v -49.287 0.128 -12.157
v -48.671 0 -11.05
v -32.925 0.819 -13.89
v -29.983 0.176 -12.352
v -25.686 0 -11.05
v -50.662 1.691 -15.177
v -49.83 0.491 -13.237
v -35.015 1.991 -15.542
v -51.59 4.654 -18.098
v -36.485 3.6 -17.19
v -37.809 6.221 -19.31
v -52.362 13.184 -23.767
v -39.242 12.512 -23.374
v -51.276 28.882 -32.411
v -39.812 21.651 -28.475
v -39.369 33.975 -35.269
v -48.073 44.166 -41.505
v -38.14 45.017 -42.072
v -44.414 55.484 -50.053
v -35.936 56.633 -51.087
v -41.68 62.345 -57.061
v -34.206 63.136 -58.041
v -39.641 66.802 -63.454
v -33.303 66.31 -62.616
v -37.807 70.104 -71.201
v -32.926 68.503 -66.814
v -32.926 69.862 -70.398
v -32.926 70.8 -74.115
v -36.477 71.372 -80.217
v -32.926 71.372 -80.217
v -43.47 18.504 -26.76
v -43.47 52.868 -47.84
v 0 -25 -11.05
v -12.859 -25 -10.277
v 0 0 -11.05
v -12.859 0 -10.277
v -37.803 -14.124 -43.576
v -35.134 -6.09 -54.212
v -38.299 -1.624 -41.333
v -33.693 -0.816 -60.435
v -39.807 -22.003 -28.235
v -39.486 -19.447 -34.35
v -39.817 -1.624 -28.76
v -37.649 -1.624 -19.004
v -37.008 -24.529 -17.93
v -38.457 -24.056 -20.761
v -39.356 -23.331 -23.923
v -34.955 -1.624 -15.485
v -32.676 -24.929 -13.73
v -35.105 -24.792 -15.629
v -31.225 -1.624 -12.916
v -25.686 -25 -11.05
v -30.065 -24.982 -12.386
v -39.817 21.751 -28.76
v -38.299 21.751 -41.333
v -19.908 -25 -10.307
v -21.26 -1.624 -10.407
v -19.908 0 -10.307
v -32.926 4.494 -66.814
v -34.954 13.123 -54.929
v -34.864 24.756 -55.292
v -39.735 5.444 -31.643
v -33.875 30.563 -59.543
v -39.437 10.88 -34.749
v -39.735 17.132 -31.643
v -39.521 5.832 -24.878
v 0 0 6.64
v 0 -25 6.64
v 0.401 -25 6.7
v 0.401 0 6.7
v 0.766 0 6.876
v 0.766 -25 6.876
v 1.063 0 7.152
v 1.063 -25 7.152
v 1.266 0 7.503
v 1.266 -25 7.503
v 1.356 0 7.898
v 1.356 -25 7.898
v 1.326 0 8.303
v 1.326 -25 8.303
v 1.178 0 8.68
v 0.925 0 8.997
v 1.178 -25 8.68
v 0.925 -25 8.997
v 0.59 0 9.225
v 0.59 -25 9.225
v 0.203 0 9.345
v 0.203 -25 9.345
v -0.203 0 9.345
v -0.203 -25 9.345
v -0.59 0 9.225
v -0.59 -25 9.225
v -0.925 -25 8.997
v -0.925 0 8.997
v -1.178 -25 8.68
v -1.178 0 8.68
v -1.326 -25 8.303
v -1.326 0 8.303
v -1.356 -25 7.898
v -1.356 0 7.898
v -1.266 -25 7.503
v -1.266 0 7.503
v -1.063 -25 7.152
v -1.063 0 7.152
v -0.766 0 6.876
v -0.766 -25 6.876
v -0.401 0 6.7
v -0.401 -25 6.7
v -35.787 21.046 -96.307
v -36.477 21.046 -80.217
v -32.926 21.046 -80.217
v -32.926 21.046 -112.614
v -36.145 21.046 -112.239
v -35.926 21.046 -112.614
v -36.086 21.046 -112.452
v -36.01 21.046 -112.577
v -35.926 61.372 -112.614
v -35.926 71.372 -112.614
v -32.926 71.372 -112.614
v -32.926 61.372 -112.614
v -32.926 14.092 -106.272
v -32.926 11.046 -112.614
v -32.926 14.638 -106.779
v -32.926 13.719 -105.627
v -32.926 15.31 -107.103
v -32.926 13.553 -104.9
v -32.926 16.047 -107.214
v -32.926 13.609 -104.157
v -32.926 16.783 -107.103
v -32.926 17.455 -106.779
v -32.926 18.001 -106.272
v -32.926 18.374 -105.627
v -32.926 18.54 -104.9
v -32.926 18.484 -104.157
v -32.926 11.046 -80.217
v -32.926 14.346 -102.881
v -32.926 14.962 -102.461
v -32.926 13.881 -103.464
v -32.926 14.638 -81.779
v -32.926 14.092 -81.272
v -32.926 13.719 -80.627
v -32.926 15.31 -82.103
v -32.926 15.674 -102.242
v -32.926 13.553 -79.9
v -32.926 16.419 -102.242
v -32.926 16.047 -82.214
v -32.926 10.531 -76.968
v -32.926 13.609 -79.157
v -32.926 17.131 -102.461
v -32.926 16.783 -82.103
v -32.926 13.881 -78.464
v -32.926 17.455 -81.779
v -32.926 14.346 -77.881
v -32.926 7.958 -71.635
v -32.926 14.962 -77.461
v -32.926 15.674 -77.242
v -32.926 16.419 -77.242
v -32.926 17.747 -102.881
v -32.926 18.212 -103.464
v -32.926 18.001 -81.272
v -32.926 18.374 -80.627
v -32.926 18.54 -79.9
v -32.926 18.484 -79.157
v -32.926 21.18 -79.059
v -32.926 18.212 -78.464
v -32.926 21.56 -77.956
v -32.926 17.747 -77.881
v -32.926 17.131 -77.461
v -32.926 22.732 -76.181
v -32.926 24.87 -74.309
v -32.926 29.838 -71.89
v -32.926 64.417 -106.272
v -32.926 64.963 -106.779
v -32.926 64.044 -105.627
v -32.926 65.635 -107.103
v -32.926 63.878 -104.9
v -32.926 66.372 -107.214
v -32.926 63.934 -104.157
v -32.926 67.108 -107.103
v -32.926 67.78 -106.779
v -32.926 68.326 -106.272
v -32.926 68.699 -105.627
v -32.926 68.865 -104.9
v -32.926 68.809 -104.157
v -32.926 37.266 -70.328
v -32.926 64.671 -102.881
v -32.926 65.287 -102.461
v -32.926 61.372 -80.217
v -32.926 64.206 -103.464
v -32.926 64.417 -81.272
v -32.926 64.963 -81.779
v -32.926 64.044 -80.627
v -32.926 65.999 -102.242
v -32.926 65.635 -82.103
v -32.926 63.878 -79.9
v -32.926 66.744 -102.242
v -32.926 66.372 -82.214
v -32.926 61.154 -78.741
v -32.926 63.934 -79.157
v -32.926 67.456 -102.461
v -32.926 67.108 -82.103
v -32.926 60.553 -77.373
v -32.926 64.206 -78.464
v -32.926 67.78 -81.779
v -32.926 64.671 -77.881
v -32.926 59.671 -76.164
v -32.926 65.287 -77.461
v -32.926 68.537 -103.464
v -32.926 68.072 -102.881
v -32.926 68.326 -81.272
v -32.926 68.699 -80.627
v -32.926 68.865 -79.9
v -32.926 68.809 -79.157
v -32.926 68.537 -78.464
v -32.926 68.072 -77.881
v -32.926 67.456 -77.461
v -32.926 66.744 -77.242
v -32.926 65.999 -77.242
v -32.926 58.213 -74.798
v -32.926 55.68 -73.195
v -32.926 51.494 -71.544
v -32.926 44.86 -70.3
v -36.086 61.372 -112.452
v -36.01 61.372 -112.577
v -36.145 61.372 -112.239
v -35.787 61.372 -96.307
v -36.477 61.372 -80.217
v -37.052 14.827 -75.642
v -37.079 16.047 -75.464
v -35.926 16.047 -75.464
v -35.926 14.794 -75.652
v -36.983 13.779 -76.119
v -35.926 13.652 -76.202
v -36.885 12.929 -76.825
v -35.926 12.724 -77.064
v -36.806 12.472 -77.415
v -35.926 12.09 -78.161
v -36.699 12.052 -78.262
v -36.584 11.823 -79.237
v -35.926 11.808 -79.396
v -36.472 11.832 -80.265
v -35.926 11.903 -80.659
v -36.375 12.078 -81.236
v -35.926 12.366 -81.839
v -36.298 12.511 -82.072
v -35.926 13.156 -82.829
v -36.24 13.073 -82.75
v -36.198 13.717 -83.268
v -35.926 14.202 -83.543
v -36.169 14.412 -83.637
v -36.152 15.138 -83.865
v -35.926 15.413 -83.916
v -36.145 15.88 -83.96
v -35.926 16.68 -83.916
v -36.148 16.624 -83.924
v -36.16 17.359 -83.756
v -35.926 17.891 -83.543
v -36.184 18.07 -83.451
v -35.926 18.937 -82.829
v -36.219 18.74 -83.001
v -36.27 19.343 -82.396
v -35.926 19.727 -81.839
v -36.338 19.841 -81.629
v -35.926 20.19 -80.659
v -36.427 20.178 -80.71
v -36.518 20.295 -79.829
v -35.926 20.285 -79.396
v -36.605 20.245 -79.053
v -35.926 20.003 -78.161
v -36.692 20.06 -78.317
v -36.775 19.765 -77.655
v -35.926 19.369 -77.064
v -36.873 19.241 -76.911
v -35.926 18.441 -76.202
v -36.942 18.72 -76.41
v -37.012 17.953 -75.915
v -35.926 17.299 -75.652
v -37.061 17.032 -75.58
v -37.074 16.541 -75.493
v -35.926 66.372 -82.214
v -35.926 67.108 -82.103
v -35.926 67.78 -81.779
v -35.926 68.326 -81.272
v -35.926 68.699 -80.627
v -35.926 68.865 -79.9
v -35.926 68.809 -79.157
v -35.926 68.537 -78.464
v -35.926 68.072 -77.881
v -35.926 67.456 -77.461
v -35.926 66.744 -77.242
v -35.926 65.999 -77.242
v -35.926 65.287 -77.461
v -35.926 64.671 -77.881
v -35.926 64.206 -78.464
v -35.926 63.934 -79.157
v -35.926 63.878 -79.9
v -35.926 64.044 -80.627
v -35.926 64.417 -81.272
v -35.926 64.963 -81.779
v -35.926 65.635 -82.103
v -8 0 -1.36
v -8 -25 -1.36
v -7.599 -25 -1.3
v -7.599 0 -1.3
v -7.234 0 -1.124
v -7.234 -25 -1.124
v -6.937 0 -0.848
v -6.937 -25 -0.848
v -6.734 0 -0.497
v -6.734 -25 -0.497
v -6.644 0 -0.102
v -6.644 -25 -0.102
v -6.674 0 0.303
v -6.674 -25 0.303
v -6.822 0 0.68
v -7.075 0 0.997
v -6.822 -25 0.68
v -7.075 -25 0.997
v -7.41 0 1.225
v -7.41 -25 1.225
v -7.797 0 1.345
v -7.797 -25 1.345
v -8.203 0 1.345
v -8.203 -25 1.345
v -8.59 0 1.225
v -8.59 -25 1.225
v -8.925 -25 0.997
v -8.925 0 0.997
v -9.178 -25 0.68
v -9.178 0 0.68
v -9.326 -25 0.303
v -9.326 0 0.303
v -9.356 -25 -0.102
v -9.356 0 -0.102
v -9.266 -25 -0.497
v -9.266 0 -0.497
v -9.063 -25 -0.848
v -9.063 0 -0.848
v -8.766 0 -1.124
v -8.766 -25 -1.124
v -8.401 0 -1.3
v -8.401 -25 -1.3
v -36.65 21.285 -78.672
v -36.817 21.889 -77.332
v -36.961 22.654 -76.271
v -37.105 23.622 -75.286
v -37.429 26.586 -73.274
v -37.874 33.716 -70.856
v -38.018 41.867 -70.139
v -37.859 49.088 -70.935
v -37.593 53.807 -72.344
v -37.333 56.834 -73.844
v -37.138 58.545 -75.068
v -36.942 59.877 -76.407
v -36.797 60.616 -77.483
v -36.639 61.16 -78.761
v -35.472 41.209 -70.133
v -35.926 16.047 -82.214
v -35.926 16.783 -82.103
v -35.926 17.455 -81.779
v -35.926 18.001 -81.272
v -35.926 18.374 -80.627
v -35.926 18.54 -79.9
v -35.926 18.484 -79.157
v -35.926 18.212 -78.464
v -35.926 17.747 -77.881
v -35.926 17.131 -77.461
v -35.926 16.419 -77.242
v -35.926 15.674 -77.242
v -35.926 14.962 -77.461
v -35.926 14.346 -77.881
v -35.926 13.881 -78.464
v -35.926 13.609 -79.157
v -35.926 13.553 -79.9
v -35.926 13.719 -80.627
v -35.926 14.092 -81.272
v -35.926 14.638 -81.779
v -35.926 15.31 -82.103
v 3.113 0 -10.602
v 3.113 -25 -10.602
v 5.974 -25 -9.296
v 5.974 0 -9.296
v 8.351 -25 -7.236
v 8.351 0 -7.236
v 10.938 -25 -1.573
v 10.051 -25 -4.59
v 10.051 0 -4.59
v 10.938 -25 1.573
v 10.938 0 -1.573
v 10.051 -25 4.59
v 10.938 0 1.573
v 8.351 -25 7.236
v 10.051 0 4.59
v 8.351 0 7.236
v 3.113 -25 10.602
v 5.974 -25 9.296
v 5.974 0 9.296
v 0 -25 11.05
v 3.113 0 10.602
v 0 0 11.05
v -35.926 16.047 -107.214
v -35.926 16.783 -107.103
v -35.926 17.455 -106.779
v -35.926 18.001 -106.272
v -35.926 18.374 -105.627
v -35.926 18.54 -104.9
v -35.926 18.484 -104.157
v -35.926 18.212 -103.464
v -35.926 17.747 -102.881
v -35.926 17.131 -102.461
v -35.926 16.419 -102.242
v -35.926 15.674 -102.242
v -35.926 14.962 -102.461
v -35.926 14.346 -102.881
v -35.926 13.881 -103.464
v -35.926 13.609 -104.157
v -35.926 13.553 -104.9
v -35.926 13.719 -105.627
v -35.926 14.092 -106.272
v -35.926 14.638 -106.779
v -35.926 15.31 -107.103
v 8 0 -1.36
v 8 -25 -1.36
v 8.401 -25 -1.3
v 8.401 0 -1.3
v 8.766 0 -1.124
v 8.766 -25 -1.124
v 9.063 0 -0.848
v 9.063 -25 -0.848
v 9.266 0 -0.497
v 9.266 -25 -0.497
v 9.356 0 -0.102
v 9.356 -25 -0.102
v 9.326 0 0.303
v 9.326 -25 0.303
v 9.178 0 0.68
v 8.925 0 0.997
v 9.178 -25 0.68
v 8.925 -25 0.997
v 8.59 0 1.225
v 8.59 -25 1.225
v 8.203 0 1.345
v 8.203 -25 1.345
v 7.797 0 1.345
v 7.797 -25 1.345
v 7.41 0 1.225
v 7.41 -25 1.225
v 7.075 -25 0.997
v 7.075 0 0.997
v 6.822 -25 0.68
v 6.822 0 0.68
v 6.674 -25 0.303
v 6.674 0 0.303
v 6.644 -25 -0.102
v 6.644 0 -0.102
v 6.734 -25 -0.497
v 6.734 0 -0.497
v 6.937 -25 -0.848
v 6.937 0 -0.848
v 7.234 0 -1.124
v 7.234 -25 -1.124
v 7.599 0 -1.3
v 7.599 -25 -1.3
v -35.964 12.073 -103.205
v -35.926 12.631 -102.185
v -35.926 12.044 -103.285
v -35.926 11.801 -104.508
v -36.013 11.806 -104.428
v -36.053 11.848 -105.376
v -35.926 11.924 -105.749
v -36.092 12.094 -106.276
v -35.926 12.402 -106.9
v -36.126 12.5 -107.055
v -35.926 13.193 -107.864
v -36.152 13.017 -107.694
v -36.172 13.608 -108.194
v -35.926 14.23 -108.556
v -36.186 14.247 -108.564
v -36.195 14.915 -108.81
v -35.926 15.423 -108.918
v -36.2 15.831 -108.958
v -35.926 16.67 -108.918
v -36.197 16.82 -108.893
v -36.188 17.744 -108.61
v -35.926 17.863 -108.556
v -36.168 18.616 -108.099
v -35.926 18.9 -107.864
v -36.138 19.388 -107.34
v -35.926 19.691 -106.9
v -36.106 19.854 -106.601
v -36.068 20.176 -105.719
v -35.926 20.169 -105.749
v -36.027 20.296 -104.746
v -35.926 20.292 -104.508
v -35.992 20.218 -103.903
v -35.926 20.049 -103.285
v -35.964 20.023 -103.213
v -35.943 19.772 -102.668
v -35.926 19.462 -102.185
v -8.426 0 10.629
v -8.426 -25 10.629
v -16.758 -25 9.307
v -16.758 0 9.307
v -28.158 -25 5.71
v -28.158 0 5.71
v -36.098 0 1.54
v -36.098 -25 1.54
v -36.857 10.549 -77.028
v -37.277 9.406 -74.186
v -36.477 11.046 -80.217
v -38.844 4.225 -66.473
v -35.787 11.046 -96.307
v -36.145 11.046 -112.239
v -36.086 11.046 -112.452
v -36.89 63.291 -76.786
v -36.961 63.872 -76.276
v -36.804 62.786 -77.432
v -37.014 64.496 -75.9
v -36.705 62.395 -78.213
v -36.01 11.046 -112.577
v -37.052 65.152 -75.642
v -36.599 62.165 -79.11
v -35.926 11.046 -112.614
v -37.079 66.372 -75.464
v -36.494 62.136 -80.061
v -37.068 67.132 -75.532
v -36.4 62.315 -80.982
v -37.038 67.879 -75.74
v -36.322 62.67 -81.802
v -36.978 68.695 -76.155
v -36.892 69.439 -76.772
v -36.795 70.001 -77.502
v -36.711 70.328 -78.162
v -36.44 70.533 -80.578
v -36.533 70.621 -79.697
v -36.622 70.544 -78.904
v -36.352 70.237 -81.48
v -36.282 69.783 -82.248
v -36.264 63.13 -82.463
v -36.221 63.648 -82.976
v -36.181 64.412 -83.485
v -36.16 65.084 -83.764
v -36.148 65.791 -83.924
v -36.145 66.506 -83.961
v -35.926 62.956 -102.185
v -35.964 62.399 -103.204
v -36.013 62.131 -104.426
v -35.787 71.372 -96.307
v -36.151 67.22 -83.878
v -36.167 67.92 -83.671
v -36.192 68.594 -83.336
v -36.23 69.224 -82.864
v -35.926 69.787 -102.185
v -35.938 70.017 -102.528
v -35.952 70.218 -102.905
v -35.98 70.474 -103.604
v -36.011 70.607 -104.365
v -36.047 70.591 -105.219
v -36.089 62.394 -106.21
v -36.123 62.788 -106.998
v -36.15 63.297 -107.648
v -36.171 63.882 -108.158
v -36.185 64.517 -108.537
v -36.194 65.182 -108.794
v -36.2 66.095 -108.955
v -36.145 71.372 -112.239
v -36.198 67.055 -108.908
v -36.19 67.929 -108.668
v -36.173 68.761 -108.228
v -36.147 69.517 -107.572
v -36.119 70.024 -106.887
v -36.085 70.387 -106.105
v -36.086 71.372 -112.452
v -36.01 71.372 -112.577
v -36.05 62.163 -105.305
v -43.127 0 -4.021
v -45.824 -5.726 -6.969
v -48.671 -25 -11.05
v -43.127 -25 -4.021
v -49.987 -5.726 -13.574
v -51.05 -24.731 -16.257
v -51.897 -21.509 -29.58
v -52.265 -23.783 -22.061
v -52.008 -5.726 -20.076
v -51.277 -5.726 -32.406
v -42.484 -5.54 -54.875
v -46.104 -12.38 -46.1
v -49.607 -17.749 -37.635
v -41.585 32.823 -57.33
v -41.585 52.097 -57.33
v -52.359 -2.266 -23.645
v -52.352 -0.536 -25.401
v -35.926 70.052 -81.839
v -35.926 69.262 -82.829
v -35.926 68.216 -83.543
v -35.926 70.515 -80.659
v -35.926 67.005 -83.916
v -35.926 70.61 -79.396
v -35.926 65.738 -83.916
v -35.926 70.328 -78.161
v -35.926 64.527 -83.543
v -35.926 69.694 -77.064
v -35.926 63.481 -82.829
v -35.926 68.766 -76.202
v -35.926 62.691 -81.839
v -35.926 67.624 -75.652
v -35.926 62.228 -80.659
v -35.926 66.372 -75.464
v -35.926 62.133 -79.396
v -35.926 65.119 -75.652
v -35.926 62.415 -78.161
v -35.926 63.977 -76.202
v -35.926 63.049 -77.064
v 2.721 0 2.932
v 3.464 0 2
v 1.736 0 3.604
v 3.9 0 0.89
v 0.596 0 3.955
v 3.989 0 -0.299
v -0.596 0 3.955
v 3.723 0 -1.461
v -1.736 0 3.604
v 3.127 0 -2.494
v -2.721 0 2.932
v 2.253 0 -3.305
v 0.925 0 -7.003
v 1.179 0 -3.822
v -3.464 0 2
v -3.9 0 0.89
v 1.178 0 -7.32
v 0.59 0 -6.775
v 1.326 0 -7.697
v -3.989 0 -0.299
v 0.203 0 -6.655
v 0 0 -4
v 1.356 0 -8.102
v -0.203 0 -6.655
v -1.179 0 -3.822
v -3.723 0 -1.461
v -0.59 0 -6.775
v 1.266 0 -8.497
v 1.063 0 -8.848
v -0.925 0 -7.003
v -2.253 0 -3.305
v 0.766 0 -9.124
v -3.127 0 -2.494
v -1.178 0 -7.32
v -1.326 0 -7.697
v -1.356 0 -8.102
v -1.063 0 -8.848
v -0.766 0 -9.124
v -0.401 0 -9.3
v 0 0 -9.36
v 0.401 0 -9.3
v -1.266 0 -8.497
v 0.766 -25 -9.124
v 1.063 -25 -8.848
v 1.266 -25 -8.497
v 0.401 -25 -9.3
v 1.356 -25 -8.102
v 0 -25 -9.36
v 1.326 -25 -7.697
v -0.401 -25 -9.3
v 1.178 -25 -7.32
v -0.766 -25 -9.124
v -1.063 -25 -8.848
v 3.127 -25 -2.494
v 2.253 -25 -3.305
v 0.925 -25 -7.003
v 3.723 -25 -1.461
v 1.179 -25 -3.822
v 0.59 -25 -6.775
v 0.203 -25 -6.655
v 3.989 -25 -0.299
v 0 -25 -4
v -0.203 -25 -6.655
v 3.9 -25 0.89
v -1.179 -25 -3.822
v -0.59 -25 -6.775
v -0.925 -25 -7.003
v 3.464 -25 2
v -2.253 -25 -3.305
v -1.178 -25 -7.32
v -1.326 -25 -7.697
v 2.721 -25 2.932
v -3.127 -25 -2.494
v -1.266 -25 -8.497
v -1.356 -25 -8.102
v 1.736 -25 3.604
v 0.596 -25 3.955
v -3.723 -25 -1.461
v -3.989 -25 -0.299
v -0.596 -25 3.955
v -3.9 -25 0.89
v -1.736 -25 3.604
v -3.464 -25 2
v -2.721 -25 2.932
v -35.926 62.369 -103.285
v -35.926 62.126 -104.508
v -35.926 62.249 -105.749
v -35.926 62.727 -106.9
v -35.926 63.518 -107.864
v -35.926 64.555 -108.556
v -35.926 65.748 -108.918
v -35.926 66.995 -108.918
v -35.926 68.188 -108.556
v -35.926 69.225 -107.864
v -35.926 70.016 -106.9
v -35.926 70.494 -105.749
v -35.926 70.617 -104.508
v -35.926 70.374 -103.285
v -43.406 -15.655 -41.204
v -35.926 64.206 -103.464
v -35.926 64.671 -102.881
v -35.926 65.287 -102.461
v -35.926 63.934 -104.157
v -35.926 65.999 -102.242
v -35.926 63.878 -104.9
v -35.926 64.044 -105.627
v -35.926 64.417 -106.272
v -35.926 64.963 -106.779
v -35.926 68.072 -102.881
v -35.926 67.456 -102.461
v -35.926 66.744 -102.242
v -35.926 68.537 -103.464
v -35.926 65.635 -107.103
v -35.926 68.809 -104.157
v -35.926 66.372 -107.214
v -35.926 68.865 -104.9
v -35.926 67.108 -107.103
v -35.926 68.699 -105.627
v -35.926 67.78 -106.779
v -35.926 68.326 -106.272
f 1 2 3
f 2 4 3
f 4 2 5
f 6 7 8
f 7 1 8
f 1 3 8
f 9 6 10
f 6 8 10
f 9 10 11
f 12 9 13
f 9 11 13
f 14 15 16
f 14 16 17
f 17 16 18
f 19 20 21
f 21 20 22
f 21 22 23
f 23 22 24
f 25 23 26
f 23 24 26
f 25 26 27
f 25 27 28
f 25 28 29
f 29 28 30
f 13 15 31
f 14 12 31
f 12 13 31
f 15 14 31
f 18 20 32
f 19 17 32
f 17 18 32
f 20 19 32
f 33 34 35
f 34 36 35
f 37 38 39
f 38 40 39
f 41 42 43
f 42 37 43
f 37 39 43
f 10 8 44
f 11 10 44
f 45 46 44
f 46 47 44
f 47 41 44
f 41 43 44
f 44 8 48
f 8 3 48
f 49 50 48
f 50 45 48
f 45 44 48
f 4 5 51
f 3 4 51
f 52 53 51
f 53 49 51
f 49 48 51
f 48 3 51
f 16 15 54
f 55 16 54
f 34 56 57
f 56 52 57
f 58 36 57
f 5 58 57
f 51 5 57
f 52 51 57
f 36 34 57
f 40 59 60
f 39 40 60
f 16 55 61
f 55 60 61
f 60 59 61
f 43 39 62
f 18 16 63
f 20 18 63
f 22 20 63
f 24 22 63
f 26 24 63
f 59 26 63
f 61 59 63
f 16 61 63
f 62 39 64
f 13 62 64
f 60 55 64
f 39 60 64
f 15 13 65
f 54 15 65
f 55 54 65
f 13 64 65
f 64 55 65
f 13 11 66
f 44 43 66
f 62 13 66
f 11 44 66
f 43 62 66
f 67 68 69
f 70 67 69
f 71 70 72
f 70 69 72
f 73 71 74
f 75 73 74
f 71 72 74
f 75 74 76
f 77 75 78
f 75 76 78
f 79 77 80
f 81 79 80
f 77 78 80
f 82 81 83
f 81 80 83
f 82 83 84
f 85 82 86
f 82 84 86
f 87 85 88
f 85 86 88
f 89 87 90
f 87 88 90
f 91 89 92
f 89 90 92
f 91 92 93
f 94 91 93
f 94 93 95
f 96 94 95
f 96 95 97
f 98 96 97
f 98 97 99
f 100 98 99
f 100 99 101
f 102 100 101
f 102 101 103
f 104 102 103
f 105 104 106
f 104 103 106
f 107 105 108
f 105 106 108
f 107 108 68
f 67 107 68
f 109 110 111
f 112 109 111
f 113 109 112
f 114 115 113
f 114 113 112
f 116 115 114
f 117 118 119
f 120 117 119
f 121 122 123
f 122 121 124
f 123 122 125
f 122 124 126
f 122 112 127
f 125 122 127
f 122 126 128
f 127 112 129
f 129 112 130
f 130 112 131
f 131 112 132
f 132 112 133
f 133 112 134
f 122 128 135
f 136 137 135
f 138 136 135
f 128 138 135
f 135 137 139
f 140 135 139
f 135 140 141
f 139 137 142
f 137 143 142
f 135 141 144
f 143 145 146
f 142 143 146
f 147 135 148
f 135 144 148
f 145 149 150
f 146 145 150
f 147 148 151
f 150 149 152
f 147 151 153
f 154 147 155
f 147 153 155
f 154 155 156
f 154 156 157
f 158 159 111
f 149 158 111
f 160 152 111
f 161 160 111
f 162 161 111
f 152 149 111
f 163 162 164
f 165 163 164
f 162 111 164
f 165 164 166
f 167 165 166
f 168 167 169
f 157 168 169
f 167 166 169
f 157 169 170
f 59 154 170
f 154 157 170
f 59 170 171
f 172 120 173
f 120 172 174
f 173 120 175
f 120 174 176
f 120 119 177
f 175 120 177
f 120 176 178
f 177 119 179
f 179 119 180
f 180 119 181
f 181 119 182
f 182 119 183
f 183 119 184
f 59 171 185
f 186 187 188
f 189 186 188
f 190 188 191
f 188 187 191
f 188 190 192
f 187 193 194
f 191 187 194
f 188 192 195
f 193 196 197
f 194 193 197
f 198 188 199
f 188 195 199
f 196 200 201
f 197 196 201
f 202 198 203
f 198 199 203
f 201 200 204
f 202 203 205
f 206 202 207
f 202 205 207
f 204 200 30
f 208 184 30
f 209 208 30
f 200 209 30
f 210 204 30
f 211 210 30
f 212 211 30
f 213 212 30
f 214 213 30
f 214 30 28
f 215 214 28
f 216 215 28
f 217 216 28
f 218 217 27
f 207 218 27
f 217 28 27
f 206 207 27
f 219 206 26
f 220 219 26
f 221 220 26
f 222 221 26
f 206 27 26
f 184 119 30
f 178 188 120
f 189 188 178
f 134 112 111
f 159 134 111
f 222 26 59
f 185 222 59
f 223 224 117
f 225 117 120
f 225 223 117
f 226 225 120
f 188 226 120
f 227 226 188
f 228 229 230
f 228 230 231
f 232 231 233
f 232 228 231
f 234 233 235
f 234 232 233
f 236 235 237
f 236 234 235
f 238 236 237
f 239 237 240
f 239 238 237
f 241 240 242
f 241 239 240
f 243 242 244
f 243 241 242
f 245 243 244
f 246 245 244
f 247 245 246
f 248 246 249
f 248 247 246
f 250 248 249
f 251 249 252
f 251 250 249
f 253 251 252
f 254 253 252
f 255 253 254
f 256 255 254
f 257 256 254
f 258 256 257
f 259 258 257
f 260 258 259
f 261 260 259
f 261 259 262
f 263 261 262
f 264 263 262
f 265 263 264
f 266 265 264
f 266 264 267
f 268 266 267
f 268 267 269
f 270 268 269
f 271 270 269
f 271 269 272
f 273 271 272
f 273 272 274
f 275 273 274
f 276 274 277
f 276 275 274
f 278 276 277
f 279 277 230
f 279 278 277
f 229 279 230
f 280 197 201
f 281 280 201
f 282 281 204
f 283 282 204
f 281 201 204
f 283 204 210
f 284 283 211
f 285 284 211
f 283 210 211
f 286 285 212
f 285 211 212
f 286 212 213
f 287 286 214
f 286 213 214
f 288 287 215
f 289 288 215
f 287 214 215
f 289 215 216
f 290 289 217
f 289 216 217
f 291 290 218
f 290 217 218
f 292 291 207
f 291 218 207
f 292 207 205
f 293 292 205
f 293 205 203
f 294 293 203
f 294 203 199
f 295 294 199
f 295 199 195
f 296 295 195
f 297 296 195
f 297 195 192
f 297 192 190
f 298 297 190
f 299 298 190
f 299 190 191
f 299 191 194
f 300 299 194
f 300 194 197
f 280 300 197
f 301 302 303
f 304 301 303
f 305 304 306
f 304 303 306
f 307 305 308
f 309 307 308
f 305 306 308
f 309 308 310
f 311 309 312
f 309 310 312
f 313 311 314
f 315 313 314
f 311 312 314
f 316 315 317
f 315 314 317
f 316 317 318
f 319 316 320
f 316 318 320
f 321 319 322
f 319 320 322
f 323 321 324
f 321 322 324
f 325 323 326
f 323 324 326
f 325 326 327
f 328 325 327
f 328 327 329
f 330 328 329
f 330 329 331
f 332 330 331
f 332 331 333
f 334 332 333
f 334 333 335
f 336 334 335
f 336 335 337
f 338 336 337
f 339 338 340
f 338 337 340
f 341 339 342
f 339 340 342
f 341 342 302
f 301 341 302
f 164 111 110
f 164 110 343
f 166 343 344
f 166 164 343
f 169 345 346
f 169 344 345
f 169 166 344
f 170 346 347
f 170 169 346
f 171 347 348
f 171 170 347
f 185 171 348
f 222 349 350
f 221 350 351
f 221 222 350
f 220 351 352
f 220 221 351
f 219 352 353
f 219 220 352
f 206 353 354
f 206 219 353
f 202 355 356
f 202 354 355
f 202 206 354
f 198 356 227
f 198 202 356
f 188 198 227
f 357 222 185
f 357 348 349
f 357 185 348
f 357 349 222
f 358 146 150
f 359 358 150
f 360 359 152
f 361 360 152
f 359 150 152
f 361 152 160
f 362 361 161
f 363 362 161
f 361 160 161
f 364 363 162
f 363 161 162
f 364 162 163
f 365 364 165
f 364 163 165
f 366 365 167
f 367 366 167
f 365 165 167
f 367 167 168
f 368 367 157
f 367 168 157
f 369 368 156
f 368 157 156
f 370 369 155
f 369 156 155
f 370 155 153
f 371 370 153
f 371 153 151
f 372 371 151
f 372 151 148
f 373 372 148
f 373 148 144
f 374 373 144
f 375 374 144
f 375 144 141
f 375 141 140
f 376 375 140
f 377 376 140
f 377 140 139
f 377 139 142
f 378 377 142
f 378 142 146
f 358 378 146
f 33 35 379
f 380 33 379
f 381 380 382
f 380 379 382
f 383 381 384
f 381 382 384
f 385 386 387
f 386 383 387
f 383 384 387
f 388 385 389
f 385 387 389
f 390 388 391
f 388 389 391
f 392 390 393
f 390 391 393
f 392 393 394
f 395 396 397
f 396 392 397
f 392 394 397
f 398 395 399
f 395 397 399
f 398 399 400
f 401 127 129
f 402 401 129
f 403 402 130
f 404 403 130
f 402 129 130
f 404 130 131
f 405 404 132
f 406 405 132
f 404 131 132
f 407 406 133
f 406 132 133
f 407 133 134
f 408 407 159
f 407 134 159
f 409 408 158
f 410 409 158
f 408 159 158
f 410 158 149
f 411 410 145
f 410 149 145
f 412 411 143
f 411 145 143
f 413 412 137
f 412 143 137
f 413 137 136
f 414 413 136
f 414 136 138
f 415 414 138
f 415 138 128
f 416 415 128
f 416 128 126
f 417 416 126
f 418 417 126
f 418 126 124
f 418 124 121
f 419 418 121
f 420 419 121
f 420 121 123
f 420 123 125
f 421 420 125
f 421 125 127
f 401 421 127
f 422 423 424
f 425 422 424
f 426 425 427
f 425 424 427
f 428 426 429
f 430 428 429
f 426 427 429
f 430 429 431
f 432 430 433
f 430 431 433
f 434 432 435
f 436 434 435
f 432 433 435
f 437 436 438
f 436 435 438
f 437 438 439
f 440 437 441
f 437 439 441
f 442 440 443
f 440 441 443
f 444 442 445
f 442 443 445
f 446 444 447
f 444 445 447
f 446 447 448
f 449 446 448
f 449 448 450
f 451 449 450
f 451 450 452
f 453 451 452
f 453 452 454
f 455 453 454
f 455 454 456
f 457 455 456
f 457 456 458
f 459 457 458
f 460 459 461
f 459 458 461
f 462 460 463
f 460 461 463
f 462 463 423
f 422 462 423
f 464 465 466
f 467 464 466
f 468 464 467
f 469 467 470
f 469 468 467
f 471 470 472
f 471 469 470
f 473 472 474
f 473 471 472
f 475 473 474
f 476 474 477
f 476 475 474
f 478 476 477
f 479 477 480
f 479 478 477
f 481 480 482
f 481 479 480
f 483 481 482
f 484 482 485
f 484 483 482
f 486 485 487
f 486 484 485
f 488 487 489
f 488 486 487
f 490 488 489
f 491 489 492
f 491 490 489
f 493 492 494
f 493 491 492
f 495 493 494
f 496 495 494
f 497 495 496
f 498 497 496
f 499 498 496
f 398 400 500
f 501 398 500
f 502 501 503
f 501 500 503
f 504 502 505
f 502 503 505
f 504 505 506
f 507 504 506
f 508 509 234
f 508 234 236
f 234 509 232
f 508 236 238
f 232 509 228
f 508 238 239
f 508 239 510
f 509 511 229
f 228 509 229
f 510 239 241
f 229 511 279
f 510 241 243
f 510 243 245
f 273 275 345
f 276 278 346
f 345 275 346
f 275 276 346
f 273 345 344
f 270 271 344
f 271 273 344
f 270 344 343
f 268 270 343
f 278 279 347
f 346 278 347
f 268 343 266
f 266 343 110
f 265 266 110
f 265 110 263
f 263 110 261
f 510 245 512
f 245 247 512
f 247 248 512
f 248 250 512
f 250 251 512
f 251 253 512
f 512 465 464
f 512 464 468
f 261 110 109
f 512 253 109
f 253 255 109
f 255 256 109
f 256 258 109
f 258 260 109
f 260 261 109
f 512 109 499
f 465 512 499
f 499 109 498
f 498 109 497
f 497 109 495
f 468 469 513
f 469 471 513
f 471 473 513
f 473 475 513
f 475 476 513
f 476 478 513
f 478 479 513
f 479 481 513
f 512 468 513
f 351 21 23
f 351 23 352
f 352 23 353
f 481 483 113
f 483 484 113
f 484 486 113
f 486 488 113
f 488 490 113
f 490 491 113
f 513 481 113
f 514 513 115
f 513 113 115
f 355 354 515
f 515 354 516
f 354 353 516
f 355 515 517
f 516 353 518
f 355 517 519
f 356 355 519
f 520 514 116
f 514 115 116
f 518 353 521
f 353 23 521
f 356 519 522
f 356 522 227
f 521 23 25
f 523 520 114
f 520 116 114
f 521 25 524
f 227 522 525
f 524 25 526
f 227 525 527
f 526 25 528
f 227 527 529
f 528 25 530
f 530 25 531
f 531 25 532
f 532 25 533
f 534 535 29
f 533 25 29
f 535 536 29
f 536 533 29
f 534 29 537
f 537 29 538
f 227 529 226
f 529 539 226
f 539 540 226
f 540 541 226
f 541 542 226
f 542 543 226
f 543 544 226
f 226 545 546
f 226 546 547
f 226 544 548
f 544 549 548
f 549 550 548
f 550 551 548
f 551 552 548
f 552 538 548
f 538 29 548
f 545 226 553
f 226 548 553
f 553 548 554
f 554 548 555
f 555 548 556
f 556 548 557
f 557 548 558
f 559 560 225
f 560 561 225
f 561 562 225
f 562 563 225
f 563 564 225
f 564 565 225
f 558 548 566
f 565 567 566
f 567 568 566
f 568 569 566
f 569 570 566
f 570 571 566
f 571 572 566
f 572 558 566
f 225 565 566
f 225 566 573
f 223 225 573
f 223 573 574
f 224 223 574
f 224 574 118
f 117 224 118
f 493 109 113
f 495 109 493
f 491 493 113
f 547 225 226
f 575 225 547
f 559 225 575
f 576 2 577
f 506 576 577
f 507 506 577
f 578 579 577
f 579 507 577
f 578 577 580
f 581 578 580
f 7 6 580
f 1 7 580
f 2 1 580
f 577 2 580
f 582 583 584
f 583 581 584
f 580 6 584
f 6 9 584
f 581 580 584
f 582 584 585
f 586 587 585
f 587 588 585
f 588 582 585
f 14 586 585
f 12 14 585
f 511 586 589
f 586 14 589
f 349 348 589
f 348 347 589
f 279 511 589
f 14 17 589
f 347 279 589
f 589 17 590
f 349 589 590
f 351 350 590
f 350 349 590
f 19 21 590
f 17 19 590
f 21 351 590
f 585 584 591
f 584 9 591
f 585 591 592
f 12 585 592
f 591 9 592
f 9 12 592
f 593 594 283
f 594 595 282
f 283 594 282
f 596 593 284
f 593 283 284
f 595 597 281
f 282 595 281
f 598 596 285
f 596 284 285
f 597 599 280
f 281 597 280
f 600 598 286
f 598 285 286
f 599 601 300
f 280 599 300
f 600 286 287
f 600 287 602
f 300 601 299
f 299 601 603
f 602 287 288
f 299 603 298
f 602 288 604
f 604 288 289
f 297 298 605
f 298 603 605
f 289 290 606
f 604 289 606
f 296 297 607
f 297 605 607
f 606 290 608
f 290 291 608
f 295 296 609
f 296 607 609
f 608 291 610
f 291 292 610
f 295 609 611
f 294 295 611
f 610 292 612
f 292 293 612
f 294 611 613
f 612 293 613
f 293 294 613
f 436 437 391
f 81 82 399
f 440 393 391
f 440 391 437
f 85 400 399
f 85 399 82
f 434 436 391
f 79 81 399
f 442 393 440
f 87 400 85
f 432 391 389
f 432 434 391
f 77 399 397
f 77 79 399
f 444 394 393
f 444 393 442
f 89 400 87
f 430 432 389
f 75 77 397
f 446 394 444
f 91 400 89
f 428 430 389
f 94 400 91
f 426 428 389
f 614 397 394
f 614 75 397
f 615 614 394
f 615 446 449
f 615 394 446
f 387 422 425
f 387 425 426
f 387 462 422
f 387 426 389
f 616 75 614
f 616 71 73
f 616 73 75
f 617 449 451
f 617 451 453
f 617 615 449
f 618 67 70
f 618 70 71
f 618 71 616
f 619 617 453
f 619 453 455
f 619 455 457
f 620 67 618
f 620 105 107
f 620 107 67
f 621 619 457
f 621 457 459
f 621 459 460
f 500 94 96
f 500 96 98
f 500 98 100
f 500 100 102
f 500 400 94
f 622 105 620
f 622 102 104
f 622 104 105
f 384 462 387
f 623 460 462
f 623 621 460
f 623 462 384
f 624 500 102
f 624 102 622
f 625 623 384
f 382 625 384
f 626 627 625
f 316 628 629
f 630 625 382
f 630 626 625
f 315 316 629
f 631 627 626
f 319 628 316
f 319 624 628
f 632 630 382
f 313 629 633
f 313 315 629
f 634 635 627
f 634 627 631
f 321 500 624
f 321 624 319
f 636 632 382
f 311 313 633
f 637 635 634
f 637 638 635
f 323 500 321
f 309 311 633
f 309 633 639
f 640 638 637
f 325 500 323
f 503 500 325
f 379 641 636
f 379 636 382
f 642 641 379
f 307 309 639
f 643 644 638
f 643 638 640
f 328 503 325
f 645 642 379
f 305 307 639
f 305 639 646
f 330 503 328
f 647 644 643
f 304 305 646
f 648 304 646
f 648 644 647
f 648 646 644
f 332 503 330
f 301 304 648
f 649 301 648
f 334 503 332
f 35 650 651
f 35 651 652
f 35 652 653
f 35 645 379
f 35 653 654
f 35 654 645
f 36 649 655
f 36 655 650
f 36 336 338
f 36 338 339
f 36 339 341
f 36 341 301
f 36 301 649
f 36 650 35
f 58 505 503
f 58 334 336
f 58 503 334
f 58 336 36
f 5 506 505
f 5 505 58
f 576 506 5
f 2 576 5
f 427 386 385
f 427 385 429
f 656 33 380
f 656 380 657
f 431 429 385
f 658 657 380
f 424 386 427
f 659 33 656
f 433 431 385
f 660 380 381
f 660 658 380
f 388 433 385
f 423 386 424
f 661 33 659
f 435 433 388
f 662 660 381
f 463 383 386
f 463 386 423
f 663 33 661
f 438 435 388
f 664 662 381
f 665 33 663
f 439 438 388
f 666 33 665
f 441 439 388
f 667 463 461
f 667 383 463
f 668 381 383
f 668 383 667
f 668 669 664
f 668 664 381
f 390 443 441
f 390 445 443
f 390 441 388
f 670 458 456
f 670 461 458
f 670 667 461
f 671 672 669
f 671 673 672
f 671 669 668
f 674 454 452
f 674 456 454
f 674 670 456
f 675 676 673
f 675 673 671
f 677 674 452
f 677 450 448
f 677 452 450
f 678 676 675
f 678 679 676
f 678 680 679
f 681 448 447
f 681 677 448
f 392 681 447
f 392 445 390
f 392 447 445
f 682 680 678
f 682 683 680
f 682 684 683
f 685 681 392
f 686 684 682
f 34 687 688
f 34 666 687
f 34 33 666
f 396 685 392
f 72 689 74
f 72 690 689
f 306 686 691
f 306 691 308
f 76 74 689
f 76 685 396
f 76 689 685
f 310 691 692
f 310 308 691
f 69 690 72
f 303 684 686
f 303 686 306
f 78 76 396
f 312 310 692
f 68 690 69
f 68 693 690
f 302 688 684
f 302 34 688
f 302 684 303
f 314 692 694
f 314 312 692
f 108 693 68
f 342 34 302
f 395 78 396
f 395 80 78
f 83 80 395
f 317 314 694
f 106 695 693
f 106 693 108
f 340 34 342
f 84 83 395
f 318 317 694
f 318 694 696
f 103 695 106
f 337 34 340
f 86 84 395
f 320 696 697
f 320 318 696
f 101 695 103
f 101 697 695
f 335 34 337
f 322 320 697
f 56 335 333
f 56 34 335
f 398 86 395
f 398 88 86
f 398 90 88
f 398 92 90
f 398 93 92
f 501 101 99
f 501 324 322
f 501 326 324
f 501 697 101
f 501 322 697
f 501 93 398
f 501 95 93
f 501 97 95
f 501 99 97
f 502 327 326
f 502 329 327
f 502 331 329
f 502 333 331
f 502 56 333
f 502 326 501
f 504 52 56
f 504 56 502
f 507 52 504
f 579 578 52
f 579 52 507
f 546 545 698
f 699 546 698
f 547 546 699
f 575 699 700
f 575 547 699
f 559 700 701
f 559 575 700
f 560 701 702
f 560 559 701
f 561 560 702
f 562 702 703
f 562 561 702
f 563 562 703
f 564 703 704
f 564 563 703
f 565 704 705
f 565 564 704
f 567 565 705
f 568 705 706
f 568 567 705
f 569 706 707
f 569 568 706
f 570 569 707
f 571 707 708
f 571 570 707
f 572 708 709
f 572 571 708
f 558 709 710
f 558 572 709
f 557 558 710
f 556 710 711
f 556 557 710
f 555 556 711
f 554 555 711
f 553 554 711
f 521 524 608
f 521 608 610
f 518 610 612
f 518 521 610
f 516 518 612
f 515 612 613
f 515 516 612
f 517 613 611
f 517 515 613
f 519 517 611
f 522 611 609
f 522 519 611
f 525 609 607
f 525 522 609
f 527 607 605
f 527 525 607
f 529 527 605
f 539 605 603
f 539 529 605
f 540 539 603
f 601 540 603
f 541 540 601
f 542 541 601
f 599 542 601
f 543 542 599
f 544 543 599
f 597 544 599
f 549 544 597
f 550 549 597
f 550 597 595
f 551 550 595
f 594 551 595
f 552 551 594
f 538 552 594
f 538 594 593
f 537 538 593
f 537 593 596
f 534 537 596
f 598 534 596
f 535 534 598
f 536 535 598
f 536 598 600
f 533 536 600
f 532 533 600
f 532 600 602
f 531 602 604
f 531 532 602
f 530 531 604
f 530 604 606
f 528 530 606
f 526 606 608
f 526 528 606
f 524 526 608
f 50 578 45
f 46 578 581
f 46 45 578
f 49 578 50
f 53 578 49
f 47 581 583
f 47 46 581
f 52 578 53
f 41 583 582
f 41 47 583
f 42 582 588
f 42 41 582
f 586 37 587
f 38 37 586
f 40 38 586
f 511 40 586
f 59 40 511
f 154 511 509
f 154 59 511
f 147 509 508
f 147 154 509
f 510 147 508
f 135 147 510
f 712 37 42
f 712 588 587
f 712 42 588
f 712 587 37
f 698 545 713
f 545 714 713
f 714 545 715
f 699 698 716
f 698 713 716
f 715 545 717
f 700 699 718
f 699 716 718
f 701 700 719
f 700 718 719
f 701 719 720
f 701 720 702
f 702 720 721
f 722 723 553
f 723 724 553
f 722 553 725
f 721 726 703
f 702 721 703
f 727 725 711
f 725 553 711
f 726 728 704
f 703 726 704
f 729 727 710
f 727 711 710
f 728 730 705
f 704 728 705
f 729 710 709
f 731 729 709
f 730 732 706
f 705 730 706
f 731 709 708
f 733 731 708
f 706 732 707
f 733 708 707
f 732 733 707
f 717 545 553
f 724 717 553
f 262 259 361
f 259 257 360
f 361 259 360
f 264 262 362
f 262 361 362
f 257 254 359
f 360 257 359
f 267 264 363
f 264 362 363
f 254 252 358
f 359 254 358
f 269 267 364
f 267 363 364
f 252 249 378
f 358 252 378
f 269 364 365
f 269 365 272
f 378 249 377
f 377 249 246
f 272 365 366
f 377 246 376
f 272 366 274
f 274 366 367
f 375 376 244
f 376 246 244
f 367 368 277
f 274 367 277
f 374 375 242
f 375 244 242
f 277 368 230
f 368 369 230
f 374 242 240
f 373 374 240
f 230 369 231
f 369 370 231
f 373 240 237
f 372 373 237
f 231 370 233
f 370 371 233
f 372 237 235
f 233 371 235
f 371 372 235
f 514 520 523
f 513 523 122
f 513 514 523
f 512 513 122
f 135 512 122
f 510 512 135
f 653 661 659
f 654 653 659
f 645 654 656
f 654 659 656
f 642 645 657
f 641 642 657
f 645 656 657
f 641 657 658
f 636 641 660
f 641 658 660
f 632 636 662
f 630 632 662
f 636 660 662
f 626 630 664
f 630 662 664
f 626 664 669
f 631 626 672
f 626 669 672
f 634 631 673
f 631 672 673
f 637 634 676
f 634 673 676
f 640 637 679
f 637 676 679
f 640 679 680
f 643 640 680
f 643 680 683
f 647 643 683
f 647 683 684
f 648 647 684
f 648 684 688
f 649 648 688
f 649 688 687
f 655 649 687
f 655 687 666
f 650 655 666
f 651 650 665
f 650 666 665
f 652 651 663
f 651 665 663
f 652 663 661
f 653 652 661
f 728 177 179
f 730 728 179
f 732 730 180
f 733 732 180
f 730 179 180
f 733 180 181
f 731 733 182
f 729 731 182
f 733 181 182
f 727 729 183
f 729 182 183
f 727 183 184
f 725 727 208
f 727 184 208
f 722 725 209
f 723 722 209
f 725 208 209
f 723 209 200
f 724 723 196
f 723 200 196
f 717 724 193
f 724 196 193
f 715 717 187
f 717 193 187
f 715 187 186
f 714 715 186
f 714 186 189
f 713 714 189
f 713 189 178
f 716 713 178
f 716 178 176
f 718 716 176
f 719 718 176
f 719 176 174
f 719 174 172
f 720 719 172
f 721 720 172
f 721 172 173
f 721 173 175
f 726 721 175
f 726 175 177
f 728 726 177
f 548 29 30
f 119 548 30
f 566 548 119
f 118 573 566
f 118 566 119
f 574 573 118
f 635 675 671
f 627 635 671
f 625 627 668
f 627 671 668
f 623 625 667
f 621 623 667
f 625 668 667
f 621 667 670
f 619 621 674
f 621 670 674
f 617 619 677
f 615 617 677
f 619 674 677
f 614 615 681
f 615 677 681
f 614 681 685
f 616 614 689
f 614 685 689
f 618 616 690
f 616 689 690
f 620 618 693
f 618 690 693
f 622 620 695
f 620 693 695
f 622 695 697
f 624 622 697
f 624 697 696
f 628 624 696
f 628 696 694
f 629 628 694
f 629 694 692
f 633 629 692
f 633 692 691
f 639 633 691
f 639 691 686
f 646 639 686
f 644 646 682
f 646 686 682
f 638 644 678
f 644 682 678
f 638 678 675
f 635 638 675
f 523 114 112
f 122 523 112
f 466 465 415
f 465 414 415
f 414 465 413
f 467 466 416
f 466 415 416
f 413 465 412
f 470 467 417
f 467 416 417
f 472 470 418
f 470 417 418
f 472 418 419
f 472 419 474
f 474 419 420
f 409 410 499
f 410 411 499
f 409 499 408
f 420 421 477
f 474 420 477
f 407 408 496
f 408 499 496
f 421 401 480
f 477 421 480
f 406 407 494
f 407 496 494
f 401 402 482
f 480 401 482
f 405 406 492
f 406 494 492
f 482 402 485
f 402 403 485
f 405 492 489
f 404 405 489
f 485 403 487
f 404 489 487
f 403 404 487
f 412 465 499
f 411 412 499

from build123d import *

# Parameters (mm, degrees)
BOSS_EXTRUDE1_START = -78.5
BOSS_EXTRUDE1_DEPTH = 157
SKETCH5_W           = 473.004377806
SKETCH5_H           = 558.860634618
CUT_EXTRUDE1_DEPTH  = 109.5
SKETCH6_R           = 1.36
SKETCH6_R_2         = 4
CUT_EXTRUDE2_DEPTH  = 25
SKETCH7_R           = 2.5
CUT_EXTRUDE3_DEPTH  = 10
SKETCH8_R           = 4.25
CUT_EXTRUDE4_DEPTH  = 2


# Read off the part's stored shape, not the designer's step: Boss-Extrude1
with BuildPart() as part:
    # Boss-Extrude1 outline → Boss-Extrude1 (new body)
    with BuildSketch(Plane.XZ.offset(BOSS_EXTRUDE1_START)):
        with BuildLine():
            ThreePointArc((0, -11.05), (11.05, 0), (0, 11.05))
            add(Edge.make_bspline(
                [(0, 11.05), (-73.705988569, 11.05), (-70.075162013, -66.476999877), (-19.953361107, -14.552256493), (-38.925778701, -112.613618432), (-35.925778701, -112.613618432)],
                knots=[0, 0, 0, 0, 0, 0, 1, 1, 1, 1, 1, 1], degree=5))
            Line((-35.925778701, -112.613618432), (-32.925778701, -112.613618432))
            Line((-32.925778701, -112.613618432), (-32.925778701, -66.813618432))
            add(Edge.make_bspline(
                [(-32.925778701, -66.813618432), (-32.925778701, -47.05), (-63.009039822, 1.033261121), (-14.925778701, -11.05), (0, -11.05)],
                knots=[0, 0, 0, 0, 0, 1, 1, 1, 1, 1], degree=4))
        make_face()
    extrude(amount=BOSS_EXTRUDE1_DEPTH)

    # Sketch5 → Cut-Extrude1 (cut, symmetric)
    with BuildSketch(Plane.ZY):
        with Locations((-57.495001252, 3.891745074)):
            Rectangle(SKETCH5_W, SKETCH5_H)
        with BuildLine():
            Line((-117.55, 11.0465), (-80.216666667, 11.0465))
            add(Edge.make_bspline(
                [(-11.05, -25), (-46.05, -25), (-65.216666667, 11.0465), (-80.216666667, 11.0465)],
                knots=[0, 0, 0, 0, 1, 1, 1, 1], degree=3))
            Line((-11.05, -25), (11.05, -25))
            Line((11.05, -25), (11.05, 0))
            Line((11.05, 0), (-11.05, 0))
            add(Edge.make_bspline(
                [(-11.05, 0), (-26.05, 0), (-40.216666667, 71.3715), (-80.216666667, 71.3715)],
                knots=[0, 0, 0, 0, 1, 1, 1, 1], degree=3))
            Line((-80.216666667, 71.3715), (-117.55, 71.3715))
            Line((-117.55, 71.3715), (-117.55, 61.3715))
            Line((-117.55, 61.3715), (-80.216666667, 61.3715))
            add(Edge.make_bspline(
                [(-80.216666667, 21.0465), (-70.133333333, 21.0465), (-70.133333333, 41.209), (-70.133333333, 61.3715), (-80.216666667, 61.3715)],
                knots=[3.141592654, 3.141592654, 3.141592654, 4.71238898, 4.71238898, 6.283185307, 6.283185307, 6.283185307], degree=2, weights=[1, 0.707106781, 1, 0.707106781, 1]))
            Line((-80.216666667, 21.0465), (-117.55, 21.0465))
            Line((-117.55, 21.0465), (-117.55, 11.0465))
        make_face(mode=Mode.SUBTRACT)
    extrude(amount=CUT_EXTRUDE1_DEPTH, both=True, mode=Mode.SUBTRACT)

    # Sketch6 → Cut-Extrude2 (cut)
    with BuildSketch(Plane.XZ.offset(25)):
        with Locations(Location((0, 8, 0), (0, 0, 270))):
            Circle(SKETCH6_R)
        with Locations(Location((0, 0, 0), (0, 0, 270))):
            Circle(SKETCH6_R_2)
        with Locations(Location((8, 0, 0), (0, 0, 270))):
            Circle(SKETCH6_R)
        with Locations(Location((-8, 0, 0), (0, 0, 270))):
            Circle(SKETCH6_R)
        with Locations(Location((0, -8, 0), (0, 0, 270))):
            Circle(SKETCH6_R)
    extrude(amount=-CUT_EXTRUDE2_DEPTH, mode=Mode.SUBTRACT)

    # Sketch7 → Cut-Extrude3 (cut)
    with BuildSketch(Plane(origin=(-32.925778701, 0, 0), x_dir=(0, 0, -1), z_dir=(1, 0, 0))):
        with Locations((79.713618432, 66.3715)):
            Circle(SKETCH7_R)
        with Locations((104.713618432, 66.3715)):
            Circle(SKETCH7_R)
        with Locations((104.713618432, 16.0465)):
            Circle(SKETCH7_R)
        with Locations((79.713618432, 16.0465)):
            Circle(SKETCH7_R)
    extrude(amount=-CUT_EXTRUDE3_DEPTH, mode=Mode.SUBTRACT)

    # Sketch8 → Cut-Extrude4 (cut)
    with BuildSketch(Plane(origin=(-37.925778701, 0, 0), x_dir=(0, 0, -1), z_dir=(1, 0, 0))):
        with Locations(Location((79.713618432, 66.3715, 0), (0, 0, 180))):
            Circle(SKETCH8_R)
        with Locations((104.713618432, 66.3715)):
            Circle(SKETCH8_R)
        with Locations((104.713618432, 16.0465)):
            Circle(SKETCH8_R)
        with Locations(Location((79.713618432, 16.0465, 0), (0, 0, 180))):
            Circle(SKETCH8_R)
    extrude(amount=CUT_EXTRUDE4_DEPTH, mode=Mode.SUBTRACT)


solid = part.part
